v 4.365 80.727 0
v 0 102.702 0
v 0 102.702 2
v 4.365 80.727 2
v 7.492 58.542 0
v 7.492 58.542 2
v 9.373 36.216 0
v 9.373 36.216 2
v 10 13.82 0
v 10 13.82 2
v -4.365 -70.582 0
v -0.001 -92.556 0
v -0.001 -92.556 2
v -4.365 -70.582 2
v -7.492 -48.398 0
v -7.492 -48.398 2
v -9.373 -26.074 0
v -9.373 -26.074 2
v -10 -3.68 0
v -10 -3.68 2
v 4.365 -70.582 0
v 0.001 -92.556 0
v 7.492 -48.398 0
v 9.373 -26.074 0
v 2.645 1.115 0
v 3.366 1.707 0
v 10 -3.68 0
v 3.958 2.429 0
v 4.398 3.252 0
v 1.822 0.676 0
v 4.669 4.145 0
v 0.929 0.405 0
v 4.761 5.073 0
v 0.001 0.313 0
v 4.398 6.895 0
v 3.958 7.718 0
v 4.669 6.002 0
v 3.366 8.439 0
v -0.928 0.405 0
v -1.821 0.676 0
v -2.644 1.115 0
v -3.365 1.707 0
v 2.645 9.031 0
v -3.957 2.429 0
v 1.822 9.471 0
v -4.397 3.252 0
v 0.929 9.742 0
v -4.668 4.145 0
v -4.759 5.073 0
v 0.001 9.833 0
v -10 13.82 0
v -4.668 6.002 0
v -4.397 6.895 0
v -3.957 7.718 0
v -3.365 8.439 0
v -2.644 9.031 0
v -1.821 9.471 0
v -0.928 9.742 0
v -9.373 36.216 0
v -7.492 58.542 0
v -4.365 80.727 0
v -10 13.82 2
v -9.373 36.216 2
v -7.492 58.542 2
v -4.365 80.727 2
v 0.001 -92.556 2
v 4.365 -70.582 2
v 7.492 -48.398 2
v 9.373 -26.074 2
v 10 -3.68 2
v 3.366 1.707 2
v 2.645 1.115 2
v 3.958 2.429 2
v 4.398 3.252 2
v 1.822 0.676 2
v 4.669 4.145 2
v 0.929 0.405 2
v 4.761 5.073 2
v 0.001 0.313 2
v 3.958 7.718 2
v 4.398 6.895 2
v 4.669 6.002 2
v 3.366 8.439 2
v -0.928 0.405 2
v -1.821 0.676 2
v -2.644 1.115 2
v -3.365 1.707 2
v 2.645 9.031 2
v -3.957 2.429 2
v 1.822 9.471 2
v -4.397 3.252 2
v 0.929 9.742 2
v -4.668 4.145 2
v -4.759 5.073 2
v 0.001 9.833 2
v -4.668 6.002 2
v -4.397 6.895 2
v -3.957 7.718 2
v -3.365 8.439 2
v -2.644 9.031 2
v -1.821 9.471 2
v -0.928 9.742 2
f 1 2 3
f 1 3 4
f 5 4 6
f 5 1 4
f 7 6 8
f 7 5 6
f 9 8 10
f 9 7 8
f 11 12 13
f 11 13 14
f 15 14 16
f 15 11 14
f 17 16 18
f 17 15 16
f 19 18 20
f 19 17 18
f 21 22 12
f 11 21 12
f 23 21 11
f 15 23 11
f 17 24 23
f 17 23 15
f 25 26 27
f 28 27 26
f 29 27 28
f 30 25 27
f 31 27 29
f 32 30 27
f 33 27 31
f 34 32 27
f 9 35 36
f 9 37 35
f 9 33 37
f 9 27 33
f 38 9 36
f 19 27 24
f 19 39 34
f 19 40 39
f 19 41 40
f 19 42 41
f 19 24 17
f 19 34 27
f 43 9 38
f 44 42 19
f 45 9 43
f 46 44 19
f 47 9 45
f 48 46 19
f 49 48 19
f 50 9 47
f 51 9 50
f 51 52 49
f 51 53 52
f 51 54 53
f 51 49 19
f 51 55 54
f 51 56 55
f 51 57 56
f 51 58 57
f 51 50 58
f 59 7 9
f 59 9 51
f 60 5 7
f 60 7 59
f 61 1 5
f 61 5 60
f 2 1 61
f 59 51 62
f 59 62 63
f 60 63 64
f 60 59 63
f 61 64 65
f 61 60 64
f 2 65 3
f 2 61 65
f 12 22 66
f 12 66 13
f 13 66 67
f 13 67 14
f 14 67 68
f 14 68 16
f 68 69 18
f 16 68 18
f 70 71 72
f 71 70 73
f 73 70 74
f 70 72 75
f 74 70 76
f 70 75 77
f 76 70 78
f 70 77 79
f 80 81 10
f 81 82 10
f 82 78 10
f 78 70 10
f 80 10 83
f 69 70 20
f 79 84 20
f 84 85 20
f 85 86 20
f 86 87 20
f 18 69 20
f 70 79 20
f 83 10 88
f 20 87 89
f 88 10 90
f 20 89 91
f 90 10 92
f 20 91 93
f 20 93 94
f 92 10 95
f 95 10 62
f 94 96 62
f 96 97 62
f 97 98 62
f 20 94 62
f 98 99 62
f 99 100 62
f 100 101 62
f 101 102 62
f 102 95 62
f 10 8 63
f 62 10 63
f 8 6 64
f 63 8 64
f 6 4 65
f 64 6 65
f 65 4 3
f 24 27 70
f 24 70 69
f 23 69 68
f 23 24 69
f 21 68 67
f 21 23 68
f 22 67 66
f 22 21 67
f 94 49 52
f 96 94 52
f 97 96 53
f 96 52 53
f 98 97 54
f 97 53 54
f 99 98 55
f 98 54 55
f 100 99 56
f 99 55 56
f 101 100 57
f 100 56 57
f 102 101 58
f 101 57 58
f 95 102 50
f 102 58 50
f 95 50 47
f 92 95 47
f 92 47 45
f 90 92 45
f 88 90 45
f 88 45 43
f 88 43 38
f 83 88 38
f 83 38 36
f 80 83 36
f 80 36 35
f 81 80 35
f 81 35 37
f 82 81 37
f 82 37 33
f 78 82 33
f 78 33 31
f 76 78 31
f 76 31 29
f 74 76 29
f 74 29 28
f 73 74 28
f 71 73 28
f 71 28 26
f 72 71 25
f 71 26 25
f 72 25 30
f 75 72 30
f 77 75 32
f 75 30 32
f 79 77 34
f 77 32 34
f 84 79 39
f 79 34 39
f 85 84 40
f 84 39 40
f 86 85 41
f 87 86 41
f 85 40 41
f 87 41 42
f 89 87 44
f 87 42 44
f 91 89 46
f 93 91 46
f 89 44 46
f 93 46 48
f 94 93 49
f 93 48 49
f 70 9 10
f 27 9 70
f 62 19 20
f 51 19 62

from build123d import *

# Parameters (mm, degrees)
BOSS_EXTRUDE1_DEPTH     = 2
SKETCH9_R               = 4.76
CUT_EXTRUDE1_DEPTH      = 15
CUT_EXTRUDE1_DEPTH_BACK = 16


with BuildPart() as part:
    # Sketch2 → Boss-Extrude1 (new body)
    with BuildSketch(Plane.XY):
        with BuildLine():
            Line((-10, -3.679637035), (-10, 13.820362965))
            ThreePointArc((-10, 13.820362965), (-7.492138287, 58.541722515), (0, 102.702307138))
            ThreePointArc((0, 102.702307138), (7.492138287, 58.541722515), (10, 13.820362965))
            Line((10, 13.820362965), (10, -3.679637035))
            ThreePointArc((10, -3.679637035), (7.492466261, -48.398081393), (0.001303671, -92.555860711))
            Line((0.001303671, -92.555860711), (-0.001303671, -92.555860711))
            ThreePointArc((-0.001303671, -92.555860711), (-7.492466261, -48.398081393), (-10, -3.679637035))
        make_face()
    extrude(amount=BOSS_EXTRUDE1_DEPTH)

    # Sketch9 → Cut-Extrude1 (cut, two sides)
    with BuildSketch(Plane(origin=(0, 0, 0), x_dir=(-1, 0, 0), z_dir=(0, 0, -1))) as cut_extrude1_sk:
        with Locations((-0.000651835, 5.073223214)):
            Circle(SKETCH9_R)
    extrude(amount=CUT_EXTRUDE1_DEPTH, mode=Mode.SUBTRACT)
    extrude(cut_extrude1_sk.sketch, amount=-CUT_EXTRUDE1_DEPTH_BACK, mode=Mode.SUBTRACT)


solid = part.part
